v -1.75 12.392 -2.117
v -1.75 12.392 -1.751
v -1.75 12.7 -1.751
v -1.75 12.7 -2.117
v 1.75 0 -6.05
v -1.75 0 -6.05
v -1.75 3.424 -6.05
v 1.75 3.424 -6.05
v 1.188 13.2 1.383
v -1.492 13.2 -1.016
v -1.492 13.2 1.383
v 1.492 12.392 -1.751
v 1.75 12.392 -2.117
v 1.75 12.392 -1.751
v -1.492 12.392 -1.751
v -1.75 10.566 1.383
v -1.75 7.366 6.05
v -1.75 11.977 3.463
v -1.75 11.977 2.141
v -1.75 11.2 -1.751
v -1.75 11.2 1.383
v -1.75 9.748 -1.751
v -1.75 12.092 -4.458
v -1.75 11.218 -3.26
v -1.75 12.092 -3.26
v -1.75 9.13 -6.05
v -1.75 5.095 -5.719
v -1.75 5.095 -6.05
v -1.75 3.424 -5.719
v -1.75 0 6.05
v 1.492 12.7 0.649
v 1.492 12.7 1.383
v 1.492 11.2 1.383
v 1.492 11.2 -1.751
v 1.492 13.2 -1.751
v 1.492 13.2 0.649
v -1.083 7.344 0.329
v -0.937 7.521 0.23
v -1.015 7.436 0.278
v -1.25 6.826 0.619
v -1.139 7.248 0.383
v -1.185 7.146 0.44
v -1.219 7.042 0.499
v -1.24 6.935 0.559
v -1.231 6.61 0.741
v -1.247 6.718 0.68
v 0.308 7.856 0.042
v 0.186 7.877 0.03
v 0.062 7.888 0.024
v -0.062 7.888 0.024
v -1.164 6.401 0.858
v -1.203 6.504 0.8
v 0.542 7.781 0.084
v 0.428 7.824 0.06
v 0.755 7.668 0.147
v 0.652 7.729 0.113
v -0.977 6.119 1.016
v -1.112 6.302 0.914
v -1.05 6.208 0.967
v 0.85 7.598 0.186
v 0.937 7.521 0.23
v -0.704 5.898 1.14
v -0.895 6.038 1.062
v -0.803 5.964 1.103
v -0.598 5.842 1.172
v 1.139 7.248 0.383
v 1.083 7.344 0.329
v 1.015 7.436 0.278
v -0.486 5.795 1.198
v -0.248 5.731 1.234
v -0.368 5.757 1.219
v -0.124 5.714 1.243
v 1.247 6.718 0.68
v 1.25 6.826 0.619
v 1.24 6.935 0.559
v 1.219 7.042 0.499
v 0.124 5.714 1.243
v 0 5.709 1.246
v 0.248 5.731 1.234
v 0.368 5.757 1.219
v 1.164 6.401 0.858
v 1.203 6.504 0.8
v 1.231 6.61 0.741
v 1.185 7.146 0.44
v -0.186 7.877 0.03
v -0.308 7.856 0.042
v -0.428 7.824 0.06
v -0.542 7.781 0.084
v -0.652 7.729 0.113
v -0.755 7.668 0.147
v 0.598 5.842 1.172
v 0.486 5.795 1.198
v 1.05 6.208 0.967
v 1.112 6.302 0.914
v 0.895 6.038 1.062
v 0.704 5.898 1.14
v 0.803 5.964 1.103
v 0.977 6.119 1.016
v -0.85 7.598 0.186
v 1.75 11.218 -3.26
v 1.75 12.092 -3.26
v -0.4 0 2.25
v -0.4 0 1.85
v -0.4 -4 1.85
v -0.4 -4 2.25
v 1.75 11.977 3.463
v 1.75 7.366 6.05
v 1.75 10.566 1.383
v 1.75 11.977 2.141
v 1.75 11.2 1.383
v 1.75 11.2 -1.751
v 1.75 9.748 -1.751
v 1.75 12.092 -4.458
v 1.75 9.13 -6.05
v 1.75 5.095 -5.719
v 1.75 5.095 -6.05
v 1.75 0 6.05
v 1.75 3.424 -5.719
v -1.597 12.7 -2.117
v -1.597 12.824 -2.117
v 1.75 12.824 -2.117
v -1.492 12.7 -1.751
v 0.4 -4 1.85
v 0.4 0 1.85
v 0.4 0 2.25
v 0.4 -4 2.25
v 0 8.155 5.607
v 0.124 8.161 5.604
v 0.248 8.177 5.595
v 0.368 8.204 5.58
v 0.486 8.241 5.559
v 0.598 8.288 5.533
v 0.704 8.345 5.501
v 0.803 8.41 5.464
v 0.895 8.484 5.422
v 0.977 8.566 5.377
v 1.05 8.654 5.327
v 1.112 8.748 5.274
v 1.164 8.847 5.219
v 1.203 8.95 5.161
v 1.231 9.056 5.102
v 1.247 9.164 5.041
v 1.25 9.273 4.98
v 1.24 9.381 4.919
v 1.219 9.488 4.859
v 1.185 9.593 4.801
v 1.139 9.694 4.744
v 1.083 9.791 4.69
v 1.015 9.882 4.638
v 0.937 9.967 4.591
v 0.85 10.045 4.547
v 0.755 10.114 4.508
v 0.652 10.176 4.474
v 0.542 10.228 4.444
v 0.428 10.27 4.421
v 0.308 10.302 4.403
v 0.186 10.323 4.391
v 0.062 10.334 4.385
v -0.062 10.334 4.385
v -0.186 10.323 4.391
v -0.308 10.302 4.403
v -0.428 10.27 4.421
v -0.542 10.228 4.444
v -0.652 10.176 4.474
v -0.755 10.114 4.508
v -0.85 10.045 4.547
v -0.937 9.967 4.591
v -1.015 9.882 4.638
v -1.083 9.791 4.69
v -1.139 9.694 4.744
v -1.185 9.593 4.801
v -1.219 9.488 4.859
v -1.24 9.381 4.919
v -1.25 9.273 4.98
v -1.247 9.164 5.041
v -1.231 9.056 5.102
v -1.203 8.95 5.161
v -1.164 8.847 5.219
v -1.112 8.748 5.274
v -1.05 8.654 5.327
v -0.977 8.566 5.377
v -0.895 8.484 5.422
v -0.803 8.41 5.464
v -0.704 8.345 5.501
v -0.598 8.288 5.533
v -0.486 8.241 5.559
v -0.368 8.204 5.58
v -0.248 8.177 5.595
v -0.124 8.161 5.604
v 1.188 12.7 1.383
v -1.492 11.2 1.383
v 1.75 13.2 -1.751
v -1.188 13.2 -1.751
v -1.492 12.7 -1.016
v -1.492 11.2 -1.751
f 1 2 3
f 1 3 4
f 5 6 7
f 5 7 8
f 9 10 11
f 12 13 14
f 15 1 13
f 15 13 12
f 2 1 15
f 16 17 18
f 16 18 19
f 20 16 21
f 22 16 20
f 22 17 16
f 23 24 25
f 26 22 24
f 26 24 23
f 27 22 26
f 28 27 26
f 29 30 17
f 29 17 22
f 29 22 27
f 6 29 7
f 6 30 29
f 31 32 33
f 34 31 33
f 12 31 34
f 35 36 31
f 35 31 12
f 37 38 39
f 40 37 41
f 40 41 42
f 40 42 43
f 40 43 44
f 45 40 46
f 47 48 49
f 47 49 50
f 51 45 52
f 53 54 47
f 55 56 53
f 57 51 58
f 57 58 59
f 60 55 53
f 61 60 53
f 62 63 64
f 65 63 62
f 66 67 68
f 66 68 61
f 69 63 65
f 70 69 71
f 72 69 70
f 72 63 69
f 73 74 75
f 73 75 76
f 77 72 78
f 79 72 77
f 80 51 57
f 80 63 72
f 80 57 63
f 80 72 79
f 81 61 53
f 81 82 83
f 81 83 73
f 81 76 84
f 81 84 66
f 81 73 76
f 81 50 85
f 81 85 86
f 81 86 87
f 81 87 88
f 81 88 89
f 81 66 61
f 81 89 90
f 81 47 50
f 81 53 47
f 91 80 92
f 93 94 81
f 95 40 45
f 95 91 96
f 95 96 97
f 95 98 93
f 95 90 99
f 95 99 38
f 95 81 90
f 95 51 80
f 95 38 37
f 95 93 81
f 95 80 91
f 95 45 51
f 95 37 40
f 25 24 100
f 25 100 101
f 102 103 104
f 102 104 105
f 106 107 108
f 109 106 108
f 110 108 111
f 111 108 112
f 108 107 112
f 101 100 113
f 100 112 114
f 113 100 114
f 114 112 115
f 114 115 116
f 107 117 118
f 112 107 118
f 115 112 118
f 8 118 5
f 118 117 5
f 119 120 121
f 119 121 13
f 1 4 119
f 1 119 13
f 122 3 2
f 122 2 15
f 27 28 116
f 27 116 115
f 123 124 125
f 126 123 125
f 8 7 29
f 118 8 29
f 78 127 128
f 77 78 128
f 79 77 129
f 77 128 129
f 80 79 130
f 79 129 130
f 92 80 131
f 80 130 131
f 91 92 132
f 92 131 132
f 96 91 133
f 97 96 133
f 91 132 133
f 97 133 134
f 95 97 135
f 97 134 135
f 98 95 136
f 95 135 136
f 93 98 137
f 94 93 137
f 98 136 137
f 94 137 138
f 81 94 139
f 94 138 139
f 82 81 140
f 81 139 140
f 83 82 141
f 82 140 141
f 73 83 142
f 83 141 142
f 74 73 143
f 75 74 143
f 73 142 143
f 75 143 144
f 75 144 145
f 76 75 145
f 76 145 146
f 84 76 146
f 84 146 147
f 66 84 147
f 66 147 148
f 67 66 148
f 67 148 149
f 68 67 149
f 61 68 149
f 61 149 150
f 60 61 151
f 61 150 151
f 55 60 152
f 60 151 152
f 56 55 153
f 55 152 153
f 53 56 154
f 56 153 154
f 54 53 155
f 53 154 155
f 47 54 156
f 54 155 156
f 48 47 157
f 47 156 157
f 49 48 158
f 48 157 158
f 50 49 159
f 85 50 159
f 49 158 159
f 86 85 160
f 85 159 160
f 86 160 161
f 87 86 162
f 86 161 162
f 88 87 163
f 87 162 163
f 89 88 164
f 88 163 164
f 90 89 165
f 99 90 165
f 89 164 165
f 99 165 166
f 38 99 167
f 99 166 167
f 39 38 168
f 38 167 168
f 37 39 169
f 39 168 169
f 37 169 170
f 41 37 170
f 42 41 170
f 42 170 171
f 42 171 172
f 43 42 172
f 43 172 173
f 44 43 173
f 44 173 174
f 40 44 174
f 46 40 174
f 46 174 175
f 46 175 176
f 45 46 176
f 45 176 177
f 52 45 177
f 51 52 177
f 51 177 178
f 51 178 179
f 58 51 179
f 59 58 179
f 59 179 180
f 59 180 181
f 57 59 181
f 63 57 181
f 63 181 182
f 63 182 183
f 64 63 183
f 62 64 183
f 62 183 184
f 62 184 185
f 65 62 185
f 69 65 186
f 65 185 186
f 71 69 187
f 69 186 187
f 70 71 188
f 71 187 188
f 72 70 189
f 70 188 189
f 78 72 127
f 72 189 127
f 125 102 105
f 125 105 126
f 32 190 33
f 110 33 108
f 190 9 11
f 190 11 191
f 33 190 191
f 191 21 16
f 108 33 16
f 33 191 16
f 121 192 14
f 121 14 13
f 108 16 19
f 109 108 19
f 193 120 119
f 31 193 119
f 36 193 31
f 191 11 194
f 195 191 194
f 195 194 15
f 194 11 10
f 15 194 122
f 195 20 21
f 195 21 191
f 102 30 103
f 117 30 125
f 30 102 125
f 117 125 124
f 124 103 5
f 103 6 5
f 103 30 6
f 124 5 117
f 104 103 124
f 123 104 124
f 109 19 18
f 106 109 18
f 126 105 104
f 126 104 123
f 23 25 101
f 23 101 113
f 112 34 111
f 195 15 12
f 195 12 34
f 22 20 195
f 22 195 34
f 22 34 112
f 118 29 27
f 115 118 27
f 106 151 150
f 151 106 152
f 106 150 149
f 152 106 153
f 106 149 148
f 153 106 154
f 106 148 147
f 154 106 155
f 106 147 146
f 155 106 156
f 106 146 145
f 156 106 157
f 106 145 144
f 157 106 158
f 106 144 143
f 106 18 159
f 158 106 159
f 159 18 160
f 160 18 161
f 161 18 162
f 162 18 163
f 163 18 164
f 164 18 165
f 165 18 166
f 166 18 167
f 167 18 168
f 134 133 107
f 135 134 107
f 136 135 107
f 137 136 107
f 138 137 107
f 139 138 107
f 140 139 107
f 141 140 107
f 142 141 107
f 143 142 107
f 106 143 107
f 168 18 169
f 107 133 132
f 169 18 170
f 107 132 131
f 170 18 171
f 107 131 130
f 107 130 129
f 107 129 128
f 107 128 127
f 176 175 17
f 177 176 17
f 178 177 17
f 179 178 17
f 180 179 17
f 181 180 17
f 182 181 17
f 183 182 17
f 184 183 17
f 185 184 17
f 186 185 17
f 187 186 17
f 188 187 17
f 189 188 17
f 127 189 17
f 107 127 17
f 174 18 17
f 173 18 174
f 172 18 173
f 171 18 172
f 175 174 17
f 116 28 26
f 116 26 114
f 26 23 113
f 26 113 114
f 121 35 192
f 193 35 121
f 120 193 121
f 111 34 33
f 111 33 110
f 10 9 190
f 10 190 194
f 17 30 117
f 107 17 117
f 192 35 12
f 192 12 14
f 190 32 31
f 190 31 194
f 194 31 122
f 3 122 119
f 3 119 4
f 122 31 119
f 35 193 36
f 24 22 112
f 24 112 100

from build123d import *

# Parameters (mm, degrees)
SKETCH_1_W          = 3.5
SKETCH_1_H          = 12.1
EXTRUDE_1_DEPTH     = 13.2
SKETCH_2_W          = 0.330714911
SKETCH_2_H          = 1.671791026
CUT_EXTRUDE_1_DEPTH = 13.2
SKETCH_8_W          = 0.257824974
SKETCH_8_H          = 3.133485684
CUT_EXTRUDE_4_DEPTH = 2
SKETCH_4_R          = 1.25
CUT_EXTRUDE_2_DEPTH = 5
CUT_EXTRUDE_3_DEPTH = 0.5
SKETCH_6_W          = 0.8
SKETCH_6_H          = 0.4
EXTRUDE_1424_DEPTH  = 4


with BuildPart() as part:
    # 草图1 → 凸台-拉伸1 (new body)
    with BuildSketch(Plane(origin=(0, 0, 0), x_dir=(1, 0, 0), z_dir=(0, 1, 0))):
        Rectangle(SKETCH_1_W, SKETCH_1_H)
    extrude(amount=EXTRUDE_1_DEPTH)

    # 草图2 → 切除-拉伸1 (cut)
    with BuildSketch(Plane.ZY.offset(1.75)):
        with Locations((-5.884642545, 4.259492563)):
            Rectangle(SKETCH_2_W, SKETCH_2_H)
        Polygon((-4.4584027, 12.092198582), (-6.05, 9.129739953), (-6.05, 13.2), (-1.750507475, 13.2), (-2.117021791, 12.824491726), (-2.117021791, 12.39177305), (-1.750507475, 12.39177305), (-1.750507475, 9.747762053), (-3.260104827, 11.218439716), (-3.260104827, 12.092198582), align=None)
        Polygon((1.382978209, 13.2), (1.382978209, 10.565811036), (2.140809297, 11.977057019), (3.463073776, 11.977057019), (6.05, 7.365579196), (6.05, 13.2), align=None)
    extrude(amount=-CUT_EXTRUDE_1_DEPTH, mode=Mode.SUBTRACT)

    # 草图8 → 切除-拉伸4 (cut)
    with BuildSketch(Plane(origin=(0, 13.2, 0), x_dir=(1, 0, 0), z_dir=(0, 1, 0))):
        with Locations((1.621087513, 0.183764633)):
            Rectangle(SKETCH_8_W, SKETCH_8_H)
        with Locations((-1.621087513, 0.183764633)):
            Rectangle(SKETCH_8_W, SKETCH_8_H)
    extrude(amount=-CUT_EXTRUDE_4_DEPTH, mode=Mode.SUBTRACT)

    # 草图4 → 切除-拉伸2 (cut)
    with BuildSketch(Plane(origin=(0, 4.344588307, 7.744701971), x_dir=(1, 0, 0), z_dir=(0, 0.4892509225965462, 0.8721430701085852))):
        with Locations(Location((0, 5.619309483, 0), (0, 0, 270))):
            Circle(SKETCH_4_R)
    extrude(amount=-CUT_EXTRUDE_2_DEPTH, mode=Mode.SUBTRACT)

    # 草图5 → 切除-拉伸3 (cut)
    with BuildSketch(Plane(origin=(0, 13.2, 0), x_dir=(1, 0, 0), z_dir=(0, 1, 0))):
        Polygon((-2.244287714, 1.689705222), (-1.702195493, 2.211037938), (2.310317802, -1.381291481), (1.810052614, -1.94007117), align=None)
    extrude(amount=-CUT_EXTRUDE_3_DEPTH, mode=Mode.SUBTRACT)

    # 草图6 → Extrude 1424 (add)
    with BuildSketch(Plane.XZ):
        with Locations((0, 2.05)):
            Rectangle(SKETCH_6_W, SKETCH_6_H)
    extrude(amount=EXTRUDE_1424_DEPTH)


solid = part.part
